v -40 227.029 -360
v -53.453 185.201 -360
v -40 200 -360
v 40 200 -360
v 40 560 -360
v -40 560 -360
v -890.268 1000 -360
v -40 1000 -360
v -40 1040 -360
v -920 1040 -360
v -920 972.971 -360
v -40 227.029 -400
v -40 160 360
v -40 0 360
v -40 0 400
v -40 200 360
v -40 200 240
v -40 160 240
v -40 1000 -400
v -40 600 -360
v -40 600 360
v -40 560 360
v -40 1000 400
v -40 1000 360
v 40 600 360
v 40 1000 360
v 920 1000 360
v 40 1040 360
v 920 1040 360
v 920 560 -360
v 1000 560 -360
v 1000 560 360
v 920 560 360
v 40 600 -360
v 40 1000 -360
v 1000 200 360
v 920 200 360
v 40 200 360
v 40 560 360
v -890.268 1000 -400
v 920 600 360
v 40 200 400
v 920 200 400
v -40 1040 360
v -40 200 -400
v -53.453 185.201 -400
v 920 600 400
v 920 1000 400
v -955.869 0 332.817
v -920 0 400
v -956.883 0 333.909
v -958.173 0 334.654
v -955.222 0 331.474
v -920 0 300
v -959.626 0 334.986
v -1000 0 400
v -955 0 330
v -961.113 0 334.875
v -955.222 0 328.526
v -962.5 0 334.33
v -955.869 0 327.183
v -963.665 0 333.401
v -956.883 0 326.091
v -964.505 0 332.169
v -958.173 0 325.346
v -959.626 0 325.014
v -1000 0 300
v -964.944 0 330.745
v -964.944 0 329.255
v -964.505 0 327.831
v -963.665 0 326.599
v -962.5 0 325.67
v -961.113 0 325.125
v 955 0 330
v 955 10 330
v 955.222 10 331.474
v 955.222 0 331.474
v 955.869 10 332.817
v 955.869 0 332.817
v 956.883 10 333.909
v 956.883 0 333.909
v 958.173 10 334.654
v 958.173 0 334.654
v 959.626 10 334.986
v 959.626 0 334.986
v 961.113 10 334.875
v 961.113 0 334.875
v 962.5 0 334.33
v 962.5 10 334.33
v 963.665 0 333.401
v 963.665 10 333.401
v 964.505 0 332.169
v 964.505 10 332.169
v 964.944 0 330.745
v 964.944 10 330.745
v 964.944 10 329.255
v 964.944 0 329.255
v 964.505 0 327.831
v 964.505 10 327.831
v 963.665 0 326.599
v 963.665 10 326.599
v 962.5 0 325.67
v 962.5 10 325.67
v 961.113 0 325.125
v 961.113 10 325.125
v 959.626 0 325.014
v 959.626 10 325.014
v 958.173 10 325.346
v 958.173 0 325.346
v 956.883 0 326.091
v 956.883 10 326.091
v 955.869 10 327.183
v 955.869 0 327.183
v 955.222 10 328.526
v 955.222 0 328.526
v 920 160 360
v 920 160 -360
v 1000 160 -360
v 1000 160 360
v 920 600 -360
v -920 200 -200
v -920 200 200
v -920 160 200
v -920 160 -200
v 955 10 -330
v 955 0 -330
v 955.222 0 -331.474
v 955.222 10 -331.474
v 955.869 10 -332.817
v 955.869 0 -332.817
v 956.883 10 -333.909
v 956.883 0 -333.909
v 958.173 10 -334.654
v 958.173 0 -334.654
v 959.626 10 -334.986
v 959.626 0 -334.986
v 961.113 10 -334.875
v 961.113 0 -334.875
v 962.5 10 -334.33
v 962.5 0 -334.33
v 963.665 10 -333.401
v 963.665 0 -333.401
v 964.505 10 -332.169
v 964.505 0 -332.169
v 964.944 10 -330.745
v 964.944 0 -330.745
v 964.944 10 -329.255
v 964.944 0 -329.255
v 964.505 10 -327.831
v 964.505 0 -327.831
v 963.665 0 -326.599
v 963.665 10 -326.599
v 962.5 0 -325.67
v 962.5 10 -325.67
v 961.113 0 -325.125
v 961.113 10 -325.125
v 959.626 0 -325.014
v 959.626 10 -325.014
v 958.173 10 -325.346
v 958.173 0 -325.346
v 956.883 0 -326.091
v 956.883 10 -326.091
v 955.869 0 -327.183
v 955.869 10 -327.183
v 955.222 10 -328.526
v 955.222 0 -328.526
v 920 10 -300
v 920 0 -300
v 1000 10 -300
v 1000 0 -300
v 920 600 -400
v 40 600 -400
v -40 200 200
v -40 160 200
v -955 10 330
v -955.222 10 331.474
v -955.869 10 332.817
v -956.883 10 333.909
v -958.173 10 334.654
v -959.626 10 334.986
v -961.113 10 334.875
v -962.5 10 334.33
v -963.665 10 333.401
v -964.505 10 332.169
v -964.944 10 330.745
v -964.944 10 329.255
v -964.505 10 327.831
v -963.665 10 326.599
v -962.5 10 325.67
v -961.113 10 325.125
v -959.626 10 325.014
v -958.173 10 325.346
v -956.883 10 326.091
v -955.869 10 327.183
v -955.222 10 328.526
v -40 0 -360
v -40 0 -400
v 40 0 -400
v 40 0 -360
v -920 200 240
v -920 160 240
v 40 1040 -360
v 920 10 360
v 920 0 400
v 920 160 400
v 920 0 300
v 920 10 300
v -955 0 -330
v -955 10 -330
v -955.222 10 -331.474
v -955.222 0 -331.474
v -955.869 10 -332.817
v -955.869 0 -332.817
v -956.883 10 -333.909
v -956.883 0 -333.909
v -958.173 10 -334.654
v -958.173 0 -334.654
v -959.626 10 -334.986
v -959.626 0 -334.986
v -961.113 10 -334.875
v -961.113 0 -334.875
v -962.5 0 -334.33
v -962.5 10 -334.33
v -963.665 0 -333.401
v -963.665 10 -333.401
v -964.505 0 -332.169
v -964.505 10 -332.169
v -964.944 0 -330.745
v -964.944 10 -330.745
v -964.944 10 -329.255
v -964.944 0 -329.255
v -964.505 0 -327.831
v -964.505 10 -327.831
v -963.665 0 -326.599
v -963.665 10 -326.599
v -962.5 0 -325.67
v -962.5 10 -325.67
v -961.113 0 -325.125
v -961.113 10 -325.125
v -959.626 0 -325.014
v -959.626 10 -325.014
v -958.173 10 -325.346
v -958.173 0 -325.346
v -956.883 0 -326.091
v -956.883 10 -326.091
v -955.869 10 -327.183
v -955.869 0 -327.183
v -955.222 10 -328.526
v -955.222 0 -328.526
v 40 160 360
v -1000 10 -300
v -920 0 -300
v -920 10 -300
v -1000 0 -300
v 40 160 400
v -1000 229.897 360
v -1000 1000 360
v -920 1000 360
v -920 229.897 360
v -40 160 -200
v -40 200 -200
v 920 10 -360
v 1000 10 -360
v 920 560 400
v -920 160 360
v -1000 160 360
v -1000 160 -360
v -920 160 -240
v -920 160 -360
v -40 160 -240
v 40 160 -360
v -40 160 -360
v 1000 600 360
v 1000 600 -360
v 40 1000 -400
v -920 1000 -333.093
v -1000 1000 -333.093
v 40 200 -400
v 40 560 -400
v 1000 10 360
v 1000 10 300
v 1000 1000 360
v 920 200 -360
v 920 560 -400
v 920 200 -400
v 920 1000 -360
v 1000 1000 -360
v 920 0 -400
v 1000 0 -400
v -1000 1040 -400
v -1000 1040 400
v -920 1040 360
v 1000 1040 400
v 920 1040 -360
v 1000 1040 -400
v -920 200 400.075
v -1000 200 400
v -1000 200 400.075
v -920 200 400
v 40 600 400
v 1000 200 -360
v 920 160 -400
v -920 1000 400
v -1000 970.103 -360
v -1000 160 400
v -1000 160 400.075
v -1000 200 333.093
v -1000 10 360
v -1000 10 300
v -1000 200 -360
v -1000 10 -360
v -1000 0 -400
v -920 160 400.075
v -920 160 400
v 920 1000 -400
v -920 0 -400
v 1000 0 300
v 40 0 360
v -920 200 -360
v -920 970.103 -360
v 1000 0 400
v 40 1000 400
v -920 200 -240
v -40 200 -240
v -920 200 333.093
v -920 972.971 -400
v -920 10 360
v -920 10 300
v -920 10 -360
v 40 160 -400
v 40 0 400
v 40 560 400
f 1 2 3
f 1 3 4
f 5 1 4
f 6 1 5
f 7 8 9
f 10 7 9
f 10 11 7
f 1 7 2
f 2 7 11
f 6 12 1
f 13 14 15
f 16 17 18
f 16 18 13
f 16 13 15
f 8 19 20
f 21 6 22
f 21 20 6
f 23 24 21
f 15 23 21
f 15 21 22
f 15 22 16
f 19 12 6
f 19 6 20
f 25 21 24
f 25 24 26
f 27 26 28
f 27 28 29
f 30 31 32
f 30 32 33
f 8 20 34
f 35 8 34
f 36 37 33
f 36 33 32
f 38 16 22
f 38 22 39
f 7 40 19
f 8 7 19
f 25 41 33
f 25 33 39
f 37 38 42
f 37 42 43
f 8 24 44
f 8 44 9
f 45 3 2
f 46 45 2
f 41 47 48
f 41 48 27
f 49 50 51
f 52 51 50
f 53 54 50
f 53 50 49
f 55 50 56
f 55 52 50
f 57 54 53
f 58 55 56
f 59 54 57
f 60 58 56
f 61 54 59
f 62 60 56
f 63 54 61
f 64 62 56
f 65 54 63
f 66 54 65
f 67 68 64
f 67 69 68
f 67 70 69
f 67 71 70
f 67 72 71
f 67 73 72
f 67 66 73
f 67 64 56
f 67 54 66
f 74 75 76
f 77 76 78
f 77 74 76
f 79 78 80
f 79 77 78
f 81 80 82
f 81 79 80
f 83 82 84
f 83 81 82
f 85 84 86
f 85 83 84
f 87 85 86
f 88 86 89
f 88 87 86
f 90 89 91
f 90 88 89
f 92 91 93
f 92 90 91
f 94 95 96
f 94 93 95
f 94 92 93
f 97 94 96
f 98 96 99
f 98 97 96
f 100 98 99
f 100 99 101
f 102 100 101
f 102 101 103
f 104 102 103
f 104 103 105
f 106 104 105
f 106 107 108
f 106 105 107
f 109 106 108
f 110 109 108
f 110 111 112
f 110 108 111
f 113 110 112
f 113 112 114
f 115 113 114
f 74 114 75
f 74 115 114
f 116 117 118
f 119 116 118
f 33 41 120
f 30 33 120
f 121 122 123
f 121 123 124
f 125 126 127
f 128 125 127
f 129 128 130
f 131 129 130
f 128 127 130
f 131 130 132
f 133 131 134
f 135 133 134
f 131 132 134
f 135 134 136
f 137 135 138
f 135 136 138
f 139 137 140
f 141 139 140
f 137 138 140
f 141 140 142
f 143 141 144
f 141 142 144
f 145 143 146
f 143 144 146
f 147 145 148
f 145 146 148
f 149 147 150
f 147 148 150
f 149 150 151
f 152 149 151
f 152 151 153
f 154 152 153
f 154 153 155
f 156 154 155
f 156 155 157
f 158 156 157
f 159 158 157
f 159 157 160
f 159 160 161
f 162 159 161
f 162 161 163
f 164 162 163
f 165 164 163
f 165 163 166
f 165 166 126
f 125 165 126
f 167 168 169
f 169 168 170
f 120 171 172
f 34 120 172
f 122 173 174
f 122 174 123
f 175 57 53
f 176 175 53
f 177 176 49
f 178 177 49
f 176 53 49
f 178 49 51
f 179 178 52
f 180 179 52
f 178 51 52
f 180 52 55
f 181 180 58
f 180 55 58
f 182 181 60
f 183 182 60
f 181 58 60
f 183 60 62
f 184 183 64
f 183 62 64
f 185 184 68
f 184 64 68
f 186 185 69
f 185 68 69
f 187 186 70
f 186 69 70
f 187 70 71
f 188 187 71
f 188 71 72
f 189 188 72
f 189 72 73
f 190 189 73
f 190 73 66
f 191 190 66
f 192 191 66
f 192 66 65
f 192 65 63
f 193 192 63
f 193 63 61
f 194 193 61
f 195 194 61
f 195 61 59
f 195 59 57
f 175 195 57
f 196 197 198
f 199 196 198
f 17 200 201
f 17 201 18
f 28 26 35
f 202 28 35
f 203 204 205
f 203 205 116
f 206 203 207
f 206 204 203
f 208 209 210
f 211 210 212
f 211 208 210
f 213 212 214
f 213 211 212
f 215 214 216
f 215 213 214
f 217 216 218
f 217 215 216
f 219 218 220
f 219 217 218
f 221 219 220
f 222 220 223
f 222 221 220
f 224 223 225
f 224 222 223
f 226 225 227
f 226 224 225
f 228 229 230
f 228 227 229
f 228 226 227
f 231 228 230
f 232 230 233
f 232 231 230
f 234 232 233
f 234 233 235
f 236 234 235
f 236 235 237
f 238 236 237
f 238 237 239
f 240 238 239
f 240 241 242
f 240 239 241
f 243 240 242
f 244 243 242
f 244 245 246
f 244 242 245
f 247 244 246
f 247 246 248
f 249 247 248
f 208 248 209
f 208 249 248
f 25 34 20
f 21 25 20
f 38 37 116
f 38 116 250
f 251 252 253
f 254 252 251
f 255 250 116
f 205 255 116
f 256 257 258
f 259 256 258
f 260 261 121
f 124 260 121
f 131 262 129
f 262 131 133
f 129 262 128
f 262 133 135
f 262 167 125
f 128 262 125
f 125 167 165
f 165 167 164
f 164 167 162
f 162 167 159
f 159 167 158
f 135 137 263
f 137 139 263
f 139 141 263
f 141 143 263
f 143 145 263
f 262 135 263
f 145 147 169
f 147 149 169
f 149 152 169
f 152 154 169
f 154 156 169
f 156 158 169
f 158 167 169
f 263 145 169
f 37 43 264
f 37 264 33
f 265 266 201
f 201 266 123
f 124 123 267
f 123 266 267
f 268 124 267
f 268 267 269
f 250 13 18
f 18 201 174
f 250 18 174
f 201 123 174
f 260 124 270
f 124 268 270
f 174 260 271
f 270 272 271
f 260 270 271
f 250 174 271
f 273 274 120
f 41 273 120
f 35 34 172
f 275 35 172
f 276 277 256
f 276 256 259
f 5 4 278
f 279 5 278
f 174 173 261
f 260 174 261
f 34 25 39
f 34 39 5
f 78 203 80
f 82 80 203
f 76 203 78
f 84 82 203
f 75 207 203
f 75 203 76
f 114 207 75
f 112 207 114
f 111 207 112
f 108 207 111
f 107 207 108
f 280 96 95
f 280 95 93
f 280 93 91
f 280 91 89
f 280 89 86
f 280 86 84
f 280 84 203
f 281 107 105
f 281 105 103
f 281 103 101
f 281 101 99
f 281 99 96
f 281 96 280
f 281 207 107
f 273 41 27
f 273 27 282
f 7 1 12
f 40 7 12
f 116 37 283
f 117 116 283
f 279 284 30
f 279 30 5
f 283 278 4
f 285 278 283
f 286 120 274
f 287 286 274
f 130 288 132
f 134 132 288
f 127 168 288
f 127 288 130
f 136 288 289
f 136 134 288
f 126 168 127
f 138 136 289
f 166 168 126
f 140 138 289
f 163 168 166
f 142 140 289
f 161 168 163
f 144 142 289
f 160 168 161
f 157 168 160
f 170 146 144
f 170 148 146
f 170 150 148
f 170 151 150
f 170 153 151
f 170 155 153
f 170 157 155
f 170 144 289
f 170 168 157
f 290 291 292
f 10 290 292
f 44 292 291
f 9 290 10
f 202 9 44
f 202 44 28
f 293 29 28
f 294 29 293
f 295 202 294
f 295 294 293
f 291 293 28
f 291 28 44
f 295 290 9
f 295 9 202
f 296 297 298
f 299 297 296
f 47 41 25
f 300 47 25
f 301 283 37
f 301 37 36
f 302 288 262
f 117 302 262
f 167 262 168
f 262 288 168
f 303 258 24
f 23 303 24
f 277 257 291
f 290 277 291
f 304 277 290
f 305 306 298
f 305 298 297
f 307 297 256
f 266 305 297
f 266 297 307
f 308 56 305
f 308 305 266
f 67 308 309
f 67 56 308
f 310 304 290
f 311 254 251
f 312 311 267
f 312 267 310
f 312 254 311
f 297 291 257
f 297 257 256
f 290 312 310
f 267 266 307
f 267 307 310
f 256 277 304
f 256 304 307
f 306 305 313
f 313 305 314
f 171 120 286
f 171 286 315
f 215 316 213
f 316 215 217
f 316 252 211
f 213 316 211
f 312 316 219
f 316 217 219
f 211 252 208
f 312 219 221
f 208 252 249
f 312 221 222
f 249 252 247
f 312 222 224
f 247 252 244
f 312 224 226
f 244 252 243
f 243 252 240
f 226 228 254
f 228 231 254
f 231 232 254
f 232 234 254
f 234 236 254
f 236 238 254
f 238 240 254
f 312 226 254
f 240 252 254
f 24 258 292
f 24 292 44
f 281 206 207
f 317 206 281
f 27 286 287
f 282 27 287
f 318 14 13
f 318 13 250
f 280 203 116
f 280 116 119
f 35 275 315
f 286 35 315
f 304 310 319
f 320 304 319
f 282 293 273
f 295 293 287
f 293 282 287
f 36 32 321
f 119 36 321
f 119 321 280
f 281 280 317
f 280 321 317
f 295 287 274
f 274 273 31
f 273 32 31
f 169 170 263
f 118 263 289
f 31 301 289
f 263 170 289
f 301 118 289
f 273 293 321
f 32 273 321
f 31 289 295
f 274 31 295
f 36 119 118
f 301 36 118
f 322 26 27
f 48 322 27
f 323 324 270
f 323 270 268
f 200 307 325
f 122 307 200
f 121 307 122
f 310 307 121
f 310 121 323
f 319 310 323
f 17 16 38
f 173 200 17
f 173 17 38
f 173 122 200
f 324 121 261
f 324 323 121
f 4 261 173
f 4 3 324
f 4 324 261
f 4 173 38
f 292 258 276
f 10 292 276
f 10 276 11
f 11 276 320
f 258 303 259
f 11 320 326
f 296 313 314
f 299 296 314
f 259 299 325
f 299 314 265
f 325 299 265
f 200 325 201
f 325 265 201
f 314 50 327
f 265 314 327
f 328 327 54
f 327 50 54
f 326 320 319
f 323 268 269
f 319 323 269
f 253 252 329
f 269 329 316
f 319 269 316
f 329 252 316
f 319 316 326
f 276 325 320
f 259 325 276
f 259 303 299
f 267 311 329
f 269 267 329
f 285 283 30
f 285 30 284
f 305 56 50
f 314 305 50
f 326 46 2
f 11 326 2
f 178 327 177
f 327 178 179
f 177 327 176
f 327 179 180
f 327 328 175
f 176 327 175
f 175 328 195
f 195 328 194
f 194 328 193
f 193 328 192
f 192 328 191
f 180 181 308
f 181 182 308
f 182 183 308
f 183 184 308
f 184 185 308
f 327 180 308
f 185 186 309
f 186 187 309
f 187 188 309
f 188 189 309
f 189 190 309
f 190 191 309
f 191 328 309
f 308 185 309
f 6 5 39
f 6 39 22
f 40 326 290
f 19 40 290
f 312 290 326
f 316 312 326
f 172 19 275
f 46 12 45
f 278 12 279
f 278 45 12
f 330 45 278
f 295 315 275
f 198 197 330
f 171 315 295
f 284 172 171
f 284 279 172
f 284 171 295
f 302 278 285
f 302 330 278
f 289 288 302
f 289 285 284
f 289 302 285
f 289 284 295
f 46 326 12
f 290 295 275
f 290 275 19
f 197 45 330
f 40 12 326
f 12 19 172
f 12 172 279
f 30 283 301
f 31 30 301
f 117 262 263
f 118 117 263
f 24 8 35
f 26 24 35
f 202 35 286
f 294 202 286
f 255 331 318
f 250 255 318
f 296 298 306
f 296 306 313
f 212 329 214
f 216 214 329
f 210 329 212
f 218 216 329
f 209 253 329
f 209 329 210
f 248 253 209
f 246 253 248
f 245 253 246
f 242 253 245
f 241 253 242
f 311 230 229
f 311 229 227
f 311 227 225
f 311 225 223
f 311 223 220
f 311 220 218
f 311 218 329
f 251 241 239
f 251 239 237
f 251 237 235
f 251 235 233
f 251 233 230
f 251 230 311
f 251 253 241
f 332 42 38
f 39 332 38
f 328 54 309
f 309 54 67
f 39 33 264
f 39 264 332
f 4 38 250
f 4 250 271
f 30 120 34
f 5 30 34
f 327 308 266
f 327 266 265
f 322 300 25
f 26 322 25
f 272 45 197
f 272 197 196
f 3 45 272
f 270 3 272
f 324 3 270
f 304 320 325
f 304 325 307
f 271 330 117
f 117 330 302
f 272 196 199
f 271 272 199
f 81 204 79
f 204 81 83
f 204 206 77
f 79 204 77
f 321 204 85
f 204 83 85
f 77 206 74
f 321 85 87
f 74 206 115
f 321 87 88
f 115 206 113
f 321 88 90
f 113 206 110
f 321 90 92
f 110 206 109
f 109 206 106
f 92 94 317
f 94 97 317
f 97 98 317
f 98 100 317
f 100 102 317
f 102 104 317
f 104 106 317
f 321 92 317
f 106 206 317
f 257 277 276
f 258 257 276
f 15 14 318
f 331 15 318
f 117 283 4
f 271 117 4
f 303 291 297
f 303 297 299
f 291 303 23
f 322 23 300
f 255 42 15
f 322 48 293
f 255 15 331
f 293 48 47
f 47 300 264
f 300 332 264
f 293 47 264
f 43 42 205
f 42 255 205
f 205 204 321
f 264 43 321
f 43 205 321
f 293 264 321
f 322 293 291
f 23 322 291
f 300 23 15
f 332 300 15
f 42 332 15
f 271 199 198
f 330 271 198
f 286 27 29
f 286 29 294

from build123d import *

# Parameters (mm, degrees)
SKETCH1_W                      = 80
SKETCH1_H                      = 40
BOSS_EXTRUDE1_DEPTH            = 1000
BOSS_EXTRUDE1_2_DEPTH          = 1000
BOSS_EXTRUDE1_3_DEPTH          = 1000
BOSS_EXTRUDE1_4_DEPTH          = 1000
BOSS_EXTRUDE1_5_DEPTH          = 1000
BOSS_EXTRUDE1_6_DEPTH          = 1000
SKETCH3_W                      = 880
SKETCH3_H                      = 720
SKETCH3_H_2                    = 400
BOSS_EXTRUDE2_DEPTH            = 40
SKETCH4_W                      = 1040
SKETCH4_H                      = 800
SKETCH4_W_2                    = 880
SKETCH4_H_2                    = 720
BOSS_EXTRUDE4_DEPTH            = 40
SKETCH6_W                      = 2000
SKETCH6_H                      = 800
SKETCH6_W_2                    = 880
SKETCH6_H_2                    = 720
BOSS_EXTRUDE5_DEPTH            = 40
SKETCH7_W                      = 80
SKETCH7_H                      = 40
SKETCH8_W                      = 40
SKETCH8_H                      = 40
SKETCH9_W                      = 80
SKETCH9_H                      = 60
BOSS_EXTRUDE6_DEPTH            = 10
F_10_0_10_DIAMETER_HOLE1_D     = 10
F_10_0_10_DIAMETER_HOLE1_DEPTH = 10
MIRROR5_COPY_1_SKETCH_W        = 80
MIRROR5_COPY_1_SKETCH_H        = 60
MIRROR5_COPY_1_DEPTH           = 10
MIRROR5_COPY_2_D               = 10
MIRROR5_COPY_2_DEPTH           = 10


with BuildPart() as part:
    # Sketch1 → Boss-Extrude1 (new body)
    with BuildSketch(Plane(origin=(0, 0, 0), x_dir=(1, 0, 0), z_dir=(0, 1, 0))):
        with Locations((-960, -380)):
            Rectangle(SKETCH1_W, SKETCH1_H)
    extrude(amount=BOSS_EXTRUDE1_DEPTH)



with BuildPart() as body_2:
    # Sketch1 → Boss-Extrude1 2 (new body)
    with BuildSketch(Plane(origin=(0, 0, 0), x_dir=(1, 0, 0), z_dir=(0, 1, 0))):
        with Locations((0, -380)):
            Rectangle(SKETCH1_W, SKETCH1_H)
    extrude(amount=BOSS_EXTRUDE1_2_DEPTH)


with BuildPart() as body_3:
    # Sketch1 → Boss-Extrude1 3 (new body)
    with BuildSketch(Plane(origin=(0, 0, 0), x_dir=(1, 0, 0), z_dir=(0, 1, 0))):
        with Locations((0, 380)):
            Rectangle(SKETCH1_W, SKETCH1_H)
    extrude(amount=BOSS_EXTRUDE1_3_DEPTH)


with BuildPart() as body_4:
    # Sketch1 → Boss-Extrude1 4 (new body)
    with BuildSketch(Plane(origin=(0, 0, 0), x_dir=(1, 0, 0), z_dir=(0, 1, 0))):
        with Locations((-960, 380)):
            Rectangle(SKETCH1_W, SKETCH1_H)
    extrude(amount=BOSS_EXTRUDE1_4_DEPTH)


with BuildPart() as body_5:
    # Sketch1 → Boss-Extrude1 5 (new body)
    with BuildSketch(Plane(origin=(0, 0, 0), x_dir=(1, 0, 0), z_dir=(0, 1, 0))):
        with Locations((960, -380)):
            Rectangle(SKETCH1_W, SKETCH1_H)
    extrude(amount=BOSS_EXTRUDE1_5_DEPTH)


with BuildPart() as body_6:
    # Sketch1 → Boss-Extrude1 6 (new body)
    with BuildSketch(Plane(origin=(0, 0, 0), x_dir=(1, 0, 0), z_dir=(0, 1, 0))):
        with Locations((960, 380)):
            Rectangle(SKETCH1_W, SKETCH1_H)
    extrude(amount=BOSS_EXTRUDE1_6_DEPTH)


with BuildPart() as part_1:
    add(part.part)

    add(body_2.part)  # Boss-Extrude2 merges body 2

    add(body_3.part)  # Boss-Extrude2 merges body 3

    add(body_4.part)  # Boss-Extrude2 merges body 4

    add(body_5.part)  # Boss-Extrude2 merges body 5

    add(body_6.part)  # Boss-Extrude2 merges body 6
    # Sketch3 → Boss-Extrude2 (add)
    with BuildSketch(Plane(origin=(0, 200, 0), x_dir=(-1, 0, 0), z_dir=(0, -1, 0))):
        Polygon((920, -240), (40, -240), (40, -400), (-1000, -400), (-1000, 400), (40, 400), (40, 240), (920, 240), (920, 400), (1000, 400), (1000, -400.075117412), (920, -400.075117412), align=None)
        with Locations((-480, 0)):
            Rectangle(SKETCH3_W, SKETCH3_H, mode=Mode.SUBTRACT)
        with Locations((480, 0)):
            Rectangle(SKETCH3_W, SKETCH3_H_2, mode=Mode.SUBTRACT)
    extrude(amount=BOSS_EXTRUDE2_DEPTH)

    # Sketch4 → Boss-Extrude4 (add)
    with BuildSketch(Plane(origin=(0, 600, 0), x_dir=(-1, 0, 0), z_dir=(0, -1, 0))):
        with Locations((-480, 0)):
            Rectangle(SKETCH4_W, SKETCH4_H)
        with Locations((-480, 0)):
            Rectangle(SKETCH4_W_2, SKETCH4_H_2, mode=Mode.SUBTRACT)
    extrude(amount=BOSS_EXTRUDE4_DEPTH)

    # Sketch6 → Boss-Extrude5 (add)
    with BuildSketch(Plane(origin=(0, 1000, 0), x_dir=(1, 0, 0), z_dir=(0, 1, 0))):
        Rectangle(SKETCH6_W, SKETCH6_H)
        with Locations((-480, 0)):
            Rectangle(SKETCH6_W_2, SKETCH6_H_2, mode=Mode.SUBTRACT)
        with Locations((480, 0)):
            Rectangle(SKETCH6_W_2, SKETCH6_H_2, mode=Mode.SUBTRACT)
    extrude(amount=BOSS_EXTRUDE5_DEPTH)

    # Sweep1: sweep along a curve in space
    with BuildLine() as sweep1_path:
        Line((-960, 200, 360), (-960, 1000, -360))
    # Sketch7 → Sweep1 (sweep)
    with BuildSketch(Plane(origin=(-960, 200, 360), x_dir=(1, 0, 0), z_dir=(0, 0.7432941462471683, -0.6689647316224475))):
        Rectangle(SKETCH7_W, SKETCH7_H)
    sweep(path=sweep1_path.line)

    # Sweep2: sweep along a curve in space
    with BuildLine() as sweep2_path:
        Line((-40, 200, -380), (-920, 1000, -380))
    # Sketch8 → Sweep2 (sweep)
    with BuildSketch(Plane(origin=(-40, 200, -380), x_dir=(0, 0, 1), z_dir=(-0.7399400733959437, 0.6726727939963126, -3.6407320166765e-15))):
        Rectangle(SKETCH8_W, SKETCH8_H)
    sweep(path=sweep2_path.line)

    # Sketch9 → Boss-Extrude6 (add)
    with BuildSketch(Plane.XZ):
        with Locations((960, -330)):
            Rectangle(SKETCH9_W, SKETCH9_H)
    boss_extrude6 = extrude(amount=-BOSS_EXTRUDE6_DEPTH)

    # Ø10.0 (10) Diameter Hole1
    with Locations(Plane(origin=(0, 10, 0), x_dir=(1, 0, 0), z_dir=(0, 1, 0))):
        with Locations((960, 330)):
            f_10_0_10_diameter_hole1 = Hole(F_10_0_10_DIAMETER_HOLE1_D / 2, depth=F_10_0_10_DIAMETER_HOLE1_DEPTH)

    # Mirror4: Boss-Extrude6, Ø10.0 (10) Diameter Hole1 across plane
    add(boss_extrude6.mirror(Plane.XY))
    add(f_10_0_10_diameter_hole1.mirror(Plane.XY), mode=Mode.SUBTRACT)

    # Mirror5: Boss-Extrude6, Ø10.0 (10) Diameter Hole1 across plane
    add(boss_extrude6.mirror(Plane(origin=(0, 0, 0), x_dir=(0, 0, 1), z_dir=(1, 0, 0))))
    add(f_10_0_10_diameter_hole1.mirror(Plane(origin=(0, 0, 0), x_dir=(0, 0, 1), z_dir=(1, 0, 0))), mode=Mode.SUBTRACT)

    # Mirror5 copy 1 sketch → Mirror5 copy 1 (add)
    with BuildSketch(Plane(origin=(0, 0, 0), x_dir=(-1, 0, 0), z_dir=(0, -1, 0))):
        with Locations((960, -330)):
            Rectangle(MIRROR5_COPY_1_SKETCH_W, MIRROR5_COPY_1_SKETCH_H)
    extrude(amount=-MIRROR5_COPY_1_DEPTH)

    # Mirror5 copy 2
    with Locations(Plane(origin=(0, 10, 0), x_dir=(-1, 0, 0), z_dir=(0, 1, 0))):
        with Locations((960, 330)):
            Hole(MIRROR5_COPY_2_D / 2, depth=MIRROR5_COPY_2_DEPTH)


solid = part_1.part
